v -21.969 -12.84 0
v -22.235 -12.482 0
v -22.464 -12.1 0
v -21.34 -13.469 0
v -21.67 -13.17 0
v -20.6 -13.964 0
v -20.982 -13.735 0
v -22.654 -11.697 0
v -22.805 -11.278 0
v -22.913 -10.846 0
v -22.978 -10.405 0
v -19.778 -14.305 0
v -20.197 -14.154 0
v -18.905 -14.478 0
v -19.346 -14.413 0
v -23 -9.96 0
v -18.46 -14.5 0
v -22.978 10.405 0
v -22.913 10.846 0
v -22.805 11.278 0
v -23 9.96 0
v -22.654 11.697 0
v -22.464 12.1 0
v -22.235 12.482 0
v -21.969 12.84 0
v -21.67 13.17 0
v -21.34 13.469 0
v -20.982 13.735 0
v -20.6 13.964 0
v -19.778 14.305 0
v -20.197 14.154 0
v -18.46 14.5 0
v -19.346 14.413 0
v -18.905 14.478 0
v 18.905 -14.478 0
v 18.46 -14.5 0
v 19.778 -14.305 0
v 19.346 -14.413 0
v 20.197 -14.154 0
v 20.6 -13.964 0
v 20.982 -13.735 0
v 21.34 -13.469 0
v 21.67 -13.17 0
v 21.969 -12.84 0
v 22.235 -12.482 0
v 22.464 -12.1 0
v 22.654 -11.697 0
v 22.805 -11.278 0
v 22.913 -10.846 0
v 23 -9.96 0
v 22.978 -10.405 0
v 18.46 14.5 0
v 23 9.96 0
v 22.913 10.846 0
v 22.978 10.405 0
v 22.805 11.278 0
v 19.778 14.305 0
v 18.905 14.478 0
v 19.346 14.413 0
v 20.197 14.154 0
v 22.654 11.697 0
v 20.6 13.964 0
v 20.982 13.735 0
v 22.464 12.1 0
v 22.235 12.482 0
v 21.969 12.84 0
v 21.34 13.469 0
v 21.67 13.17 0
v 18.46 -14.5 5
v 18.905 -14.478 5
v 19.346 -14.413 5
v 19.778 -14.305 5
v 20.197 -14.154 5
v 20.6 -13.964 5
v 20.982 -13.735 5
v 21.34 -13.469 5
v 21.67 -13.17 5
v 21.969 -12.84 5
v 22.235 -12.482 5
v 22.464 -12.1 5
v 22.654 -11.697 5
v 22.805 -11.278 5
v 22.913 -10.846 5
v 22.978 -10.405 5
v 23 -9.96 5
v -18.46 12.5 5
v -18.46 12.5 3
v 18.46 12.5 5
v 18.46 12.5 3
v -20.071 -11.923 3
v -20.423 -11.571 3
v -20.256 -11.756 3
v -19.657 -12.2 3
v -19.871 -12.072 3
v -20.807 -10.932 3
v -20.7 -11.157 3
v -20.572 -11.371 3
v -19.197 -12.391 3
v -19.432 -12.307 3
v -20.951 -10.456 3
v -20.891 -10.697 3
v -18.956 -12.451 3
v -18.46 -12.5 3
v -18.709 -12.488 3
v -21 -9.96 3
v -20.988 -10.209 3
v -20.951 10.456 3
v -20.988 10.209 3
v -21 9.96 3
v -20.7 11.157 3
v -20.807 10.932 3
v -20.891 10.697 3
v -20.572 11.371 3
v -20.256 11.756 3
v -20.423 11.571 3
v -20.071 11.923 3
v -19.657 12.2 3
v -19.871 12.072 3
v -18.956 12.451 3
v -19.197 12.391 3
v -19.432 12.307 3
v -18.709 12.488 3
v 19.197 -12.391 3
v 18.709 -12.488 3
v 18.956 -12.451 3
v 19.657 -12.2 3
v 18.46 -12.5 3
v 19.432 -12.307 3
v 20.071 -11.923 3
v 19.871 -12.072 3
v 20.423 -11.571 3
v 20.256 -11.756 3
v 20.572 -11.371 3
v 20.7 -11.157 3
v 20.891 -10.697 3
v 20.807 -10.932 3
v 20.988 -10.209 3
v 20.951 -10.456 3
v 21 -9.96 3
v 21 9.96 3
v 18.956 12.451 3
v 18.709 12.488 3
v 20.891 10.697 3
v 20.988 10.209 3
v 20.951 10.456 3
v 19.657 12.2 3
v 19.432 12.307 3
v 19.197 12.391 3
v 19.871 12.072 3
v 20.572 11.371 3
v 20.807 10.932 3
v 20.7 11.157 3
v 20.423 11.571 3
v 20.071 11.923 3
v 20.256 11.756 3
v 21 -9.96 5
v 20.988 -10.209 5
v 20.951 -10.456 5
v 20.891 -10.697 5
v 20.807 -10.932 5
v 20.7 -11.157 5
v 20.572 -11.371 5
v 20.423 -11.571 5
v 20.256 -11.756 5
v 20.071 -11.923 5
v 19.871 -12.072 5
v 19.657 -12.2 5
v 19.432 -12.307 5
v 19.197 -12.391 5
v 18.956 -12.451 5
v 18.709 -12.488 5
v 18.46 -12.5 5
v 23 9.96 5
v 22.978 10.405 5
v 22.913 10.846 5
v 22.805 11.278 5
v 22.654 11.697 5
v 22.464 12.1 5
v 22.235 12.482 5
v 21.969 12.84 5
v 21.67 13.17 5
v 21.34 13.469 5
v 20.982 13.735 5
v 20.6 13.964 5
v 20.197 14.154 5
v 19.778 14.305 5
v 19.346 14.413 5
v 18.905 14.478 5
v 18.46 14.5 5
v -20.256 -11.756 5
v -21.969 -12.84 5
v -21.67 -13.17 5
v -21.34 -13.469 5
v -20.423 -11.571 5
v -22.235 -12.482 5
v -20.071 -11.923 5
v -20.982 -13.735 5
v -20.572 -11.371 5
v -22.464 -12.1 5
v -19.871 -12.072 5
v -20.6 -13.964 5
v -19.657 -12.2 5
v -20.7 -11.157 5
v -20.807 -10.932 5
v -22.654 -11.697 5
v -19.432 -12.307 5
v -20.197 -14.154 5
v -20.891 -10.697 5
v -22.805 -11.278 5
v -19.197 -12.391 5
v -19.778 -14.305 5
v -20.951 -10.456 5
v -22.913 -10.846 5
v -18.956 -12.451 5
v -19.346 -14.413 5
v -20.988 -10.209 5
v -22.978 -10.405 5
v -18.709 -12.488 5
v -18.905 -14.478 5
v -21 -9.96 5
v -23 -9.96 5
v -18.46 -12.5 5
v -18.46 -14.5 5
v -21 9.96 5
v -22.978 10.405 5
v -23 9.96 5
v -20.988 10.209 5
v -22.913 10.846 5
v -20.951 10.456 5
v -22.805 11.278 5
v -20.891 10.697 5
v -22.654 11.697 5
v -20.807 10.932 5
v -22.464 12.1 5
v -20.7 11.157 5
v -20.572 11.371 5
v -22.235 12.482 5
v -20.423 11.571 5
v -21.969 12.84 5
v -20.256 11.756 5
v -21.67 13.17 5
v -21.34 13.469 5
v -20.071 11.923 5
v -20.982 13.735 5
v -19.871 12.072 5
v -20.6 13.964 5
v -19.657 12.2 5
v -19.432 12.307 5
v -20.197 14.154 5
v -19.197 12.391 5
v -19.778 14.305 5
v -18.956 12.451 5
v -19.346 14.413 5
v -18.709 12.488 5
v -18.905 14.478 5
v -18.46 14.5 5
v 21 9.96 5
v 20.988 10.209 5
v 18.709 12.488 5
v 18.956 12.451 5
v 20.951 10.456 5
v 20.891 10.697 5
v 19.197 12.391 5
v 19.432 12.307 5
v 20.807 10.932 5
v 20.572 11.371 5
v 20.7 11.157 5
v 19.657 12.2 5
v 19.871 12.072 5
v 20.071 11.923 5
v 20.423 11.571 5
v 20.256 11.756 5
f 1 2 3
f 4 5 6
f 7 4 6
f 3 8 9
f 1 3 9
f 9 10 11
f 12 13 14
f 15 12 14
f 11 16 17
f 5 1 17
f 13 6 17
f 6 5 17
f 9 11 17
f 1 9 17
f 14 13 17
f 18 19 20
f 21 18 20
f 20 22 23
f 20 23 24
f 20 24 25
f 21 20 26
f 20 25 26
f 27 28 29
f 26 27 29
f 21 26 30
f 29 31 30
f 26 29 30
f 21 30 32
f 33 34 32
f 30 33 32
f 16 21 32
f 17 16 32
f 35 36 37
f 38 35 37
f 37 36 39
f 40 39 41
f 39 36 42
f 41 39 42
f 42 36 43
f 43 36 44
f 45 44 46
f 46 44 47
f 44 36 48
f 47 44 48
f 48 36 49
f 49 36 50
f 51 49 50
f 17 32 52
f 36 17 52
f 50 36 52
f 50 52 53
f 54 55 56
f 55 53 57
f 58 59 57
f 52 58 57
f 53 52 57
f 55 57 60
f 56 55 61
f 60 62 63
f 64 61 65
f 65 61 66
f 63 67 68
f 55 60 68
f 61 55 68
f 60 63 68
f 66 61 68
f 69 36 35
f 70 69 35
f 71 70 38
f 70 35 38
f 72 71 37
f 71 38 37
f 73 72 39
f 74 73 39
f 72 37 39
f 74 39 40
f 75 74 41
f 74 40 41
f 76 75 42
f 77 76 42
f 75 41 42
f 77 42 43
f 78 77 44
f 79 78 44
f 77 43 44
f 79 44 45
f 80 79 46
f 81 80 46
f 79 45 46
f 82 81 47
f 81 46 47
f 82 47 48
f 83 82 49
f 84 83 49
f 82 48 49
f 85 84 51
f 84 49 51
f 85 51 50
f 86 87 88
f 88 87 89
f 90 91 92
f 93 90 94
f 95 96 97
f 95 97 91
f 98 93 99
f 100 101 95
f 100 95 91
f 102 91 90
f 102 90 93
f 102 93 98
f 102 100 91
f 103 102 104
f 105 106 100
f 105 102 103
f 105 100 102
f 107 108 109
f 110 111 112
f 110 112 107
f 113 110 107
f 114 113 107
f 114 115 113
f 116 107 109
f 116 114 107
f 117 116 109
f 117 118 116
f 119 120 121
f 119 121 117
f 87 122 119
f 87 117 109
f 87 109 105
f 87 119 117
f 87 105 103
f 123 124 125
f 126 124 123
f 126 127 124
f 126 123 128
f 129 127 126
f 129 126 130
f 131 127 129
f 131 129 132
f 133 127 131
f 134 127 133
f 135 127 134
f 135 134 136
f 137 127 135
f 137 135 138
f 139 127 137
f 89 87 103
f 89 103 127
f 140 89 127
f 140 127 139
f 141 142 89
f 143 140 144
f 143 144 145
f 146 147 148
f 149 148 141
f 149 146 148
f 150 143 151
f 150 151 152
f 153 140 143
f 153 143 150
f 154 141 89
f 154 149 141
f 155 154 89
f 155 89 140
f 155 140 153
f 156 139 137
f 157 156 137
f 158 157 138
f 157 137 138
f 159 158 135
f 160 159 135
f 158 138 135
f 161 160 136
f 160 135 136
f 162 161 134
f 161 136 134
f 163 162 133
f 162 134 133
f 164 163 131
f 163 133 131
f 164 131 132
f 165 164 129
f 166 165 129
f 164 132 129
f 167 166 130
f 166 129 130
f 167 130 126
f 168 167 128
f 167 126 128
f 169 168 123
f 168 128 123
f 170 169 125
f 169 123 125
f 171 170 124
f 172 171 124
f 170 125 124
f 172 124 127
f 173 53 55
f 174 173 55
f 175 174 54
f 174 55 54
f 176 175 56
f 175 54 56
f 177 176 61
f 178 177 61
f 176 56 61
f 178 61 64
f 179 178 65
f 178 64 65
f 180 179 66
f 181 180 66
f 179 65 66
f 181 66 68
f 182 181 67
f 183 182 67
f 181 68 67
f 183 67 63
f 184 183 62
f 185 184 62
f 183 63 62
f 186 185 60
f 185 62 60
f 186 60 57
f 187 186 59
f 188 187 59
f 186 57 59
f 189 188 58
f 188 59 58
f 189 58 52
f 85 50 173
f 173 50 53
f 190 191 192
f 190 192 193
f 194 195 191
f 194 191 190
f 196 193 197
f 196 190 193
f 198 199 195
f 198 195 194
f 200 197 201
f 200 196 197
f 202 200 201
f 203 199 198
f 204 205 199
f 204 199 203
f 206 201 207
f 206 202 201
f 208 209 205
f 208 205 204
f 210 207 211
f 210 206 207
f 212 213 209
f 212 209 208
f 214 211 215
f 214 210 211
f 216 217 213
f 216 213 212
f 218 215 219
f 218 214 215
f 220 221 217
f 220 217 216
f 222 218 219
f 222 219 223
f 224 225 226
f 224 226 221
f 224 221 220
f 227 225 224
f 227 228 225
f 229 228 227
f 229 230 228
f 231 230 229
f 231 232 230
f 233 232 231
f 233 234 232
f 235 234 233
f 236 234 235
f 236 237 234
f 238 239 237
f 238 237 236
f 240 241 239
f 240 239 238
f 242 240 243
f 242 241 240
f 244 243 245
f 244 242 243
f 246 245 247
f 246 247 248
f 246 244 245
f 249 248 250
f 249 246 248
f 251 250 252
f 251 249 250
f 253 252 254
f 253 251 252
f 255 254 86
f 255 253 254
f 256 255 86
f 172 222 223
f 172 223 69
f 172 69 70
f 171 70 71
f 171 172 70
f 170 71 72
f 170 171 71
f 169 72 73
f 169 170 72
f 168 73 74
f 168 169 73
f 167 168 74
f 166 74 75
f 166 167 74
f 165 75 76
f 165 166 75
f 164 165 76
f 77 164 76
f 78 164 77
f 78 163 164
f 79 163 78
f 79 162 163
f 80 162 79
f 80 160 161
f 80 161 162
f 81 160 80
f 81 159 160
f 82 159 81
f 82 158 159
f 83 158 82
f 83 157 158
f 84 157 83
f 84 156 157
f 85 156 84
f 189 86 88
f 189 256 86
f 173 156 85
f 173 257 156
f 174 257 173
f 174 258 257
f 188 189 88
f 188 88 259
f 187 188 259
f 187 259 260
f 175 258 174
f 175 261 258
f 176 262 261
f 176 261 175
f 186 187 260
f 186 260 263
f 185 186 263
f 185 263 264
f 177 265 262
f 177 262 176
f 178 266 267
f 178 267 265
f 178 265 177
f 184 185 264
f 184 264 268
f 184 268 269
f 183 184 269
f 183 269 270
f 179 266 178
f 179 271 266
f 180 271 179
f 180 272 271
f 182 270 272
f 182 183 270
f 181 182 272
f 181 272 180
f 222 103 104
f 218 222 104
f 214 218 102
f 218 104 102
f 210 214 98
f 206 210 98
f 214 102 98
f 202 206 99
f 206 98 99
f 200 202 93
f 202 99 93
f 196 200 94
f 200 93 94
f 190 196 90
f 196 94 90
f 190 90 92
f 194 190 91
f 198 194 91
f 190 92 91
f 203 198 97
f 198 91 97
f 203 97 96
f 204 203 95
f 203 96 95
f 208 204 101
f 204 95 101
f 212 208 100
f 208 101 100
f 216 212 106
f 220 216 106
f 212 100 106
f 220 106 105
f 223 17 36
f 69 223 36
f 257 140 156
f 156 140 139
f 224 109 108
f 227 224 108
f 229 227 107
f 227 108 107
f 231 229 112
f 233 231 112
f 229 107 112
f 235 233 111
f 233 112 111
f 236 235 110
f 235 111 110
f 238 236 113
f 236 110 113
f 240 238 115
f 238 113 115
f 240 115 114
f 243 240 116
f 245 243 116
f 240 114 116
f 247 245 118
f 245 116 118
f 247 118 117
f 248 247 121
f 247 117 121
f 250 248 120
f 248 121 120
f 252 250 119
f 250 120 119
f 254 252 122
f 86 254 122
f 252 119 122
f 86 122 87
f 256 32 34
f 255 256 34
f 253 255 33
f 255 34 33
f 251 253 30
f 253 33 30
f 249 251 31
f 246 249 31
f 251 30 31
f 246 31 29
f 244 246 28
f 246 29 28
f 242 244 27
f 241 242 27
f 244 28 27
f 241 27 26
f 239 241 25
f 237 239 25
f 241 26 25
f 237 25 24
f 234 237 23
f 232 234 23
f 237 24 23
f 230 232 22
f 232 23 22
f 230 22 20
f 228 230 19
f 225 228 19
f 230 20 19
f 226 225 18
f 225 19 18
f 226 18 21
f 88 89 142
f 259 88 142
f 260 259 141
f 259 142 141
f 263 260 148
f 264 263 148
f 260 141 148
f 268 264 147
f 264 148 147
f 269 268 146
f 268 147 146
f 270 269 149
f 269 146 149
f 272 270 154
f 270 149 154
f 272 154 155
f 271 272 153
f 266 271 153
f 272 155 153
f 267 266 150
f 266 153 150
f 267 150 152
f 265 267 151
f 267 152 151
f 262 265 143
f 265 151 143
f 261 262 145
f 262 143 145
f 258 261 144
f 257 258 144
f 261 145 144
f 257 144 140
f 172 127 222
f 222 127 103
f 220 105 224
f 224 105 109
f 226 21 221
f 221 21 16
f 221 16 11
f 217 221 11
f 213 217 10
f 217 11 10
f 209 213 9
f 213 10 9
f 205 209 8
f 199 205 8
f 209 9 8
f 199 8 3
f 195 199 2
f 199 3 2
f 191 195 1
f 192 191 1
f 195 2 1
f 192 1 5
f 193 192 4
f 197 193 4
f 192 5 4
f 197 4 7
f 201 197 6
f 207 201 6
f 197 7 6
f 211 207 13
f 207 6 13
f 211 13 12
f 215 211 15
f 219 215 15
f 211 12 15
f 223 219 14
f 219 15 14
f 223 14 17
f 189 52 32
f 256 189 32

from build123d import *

# Parameters (mm, degrees)
F2_DEPTH = 3
F3_DEPTH = 5


with BuildPart() as f2:
    # F0 (on Top) → F2 (new body)
    with BuildSketch(Plane.XY):
        with BuildLine():
            ThreePointArc((21, 9.96), (20.256051, 11.756051), (18.46, 12.5))
            Line((18.46, 12.5), (-18.46, 12.5))
            ThreePointArc((-18.46, 12.5), (-20.256051, 11.756051), (-21, 9.96))
            Line((-21, 9.96), (-21, -9.96))
            ThreePointArc((-21, -9.96), (-20.256051, -11.756051), (-18.46, -12.5))
            Line((-18.46, -12.5), (18.46, -12.5))
            ThreePointArc((18.46, -12.5), (20.256051, -11.756051), (21, -9.96))
            Line((21, -9.96), (21, 9.96))
        make_face()
    extrude(amount=F2_DEPTH)

    # F1 (on face) → F3 (join)
    with BuildSketch(Plane.XY):
        with BuildLine():
            ThreePointArc((23, 9.96), (21.670265, 13.170265), (18.46, 14.5))
            Line((18.46, 14.5), (-18.46, 14.5))
            ThreePointArc((-18.46, 14.5), (-21.670265, 13.170265), (-23, 9.96))
            Line((-23, 9.96), (-23, -9.96))
            ThreePointArc((-23, -9.96), (-21.670265, -13.170265), (-18.46, -14.5))
            Line((-18.46, -14.5), (18.46, -14.5))
            ThreePointArc((18.46, -14.5), (21.670265, -13.170265), (23, -9.96))
            Line((23, -9.96), (23, 9.96))
        make_face()
        with BuildLine():
            ThreePointArc((18.46, 12.5), (20.256051, 11.756051), (21, 9.96))
            Line((21, 9.96), (21, -9.96))
            ThreePointArc((21, -9.96), (20.256051, -11.756051), (18.46, -12.5))
            Line((18.46, -12.5), (-18.46, -12.5))
            ThreePointArc((-18.46, -12.5), (-20.256051, -11.756051), (-21, -9.96))
            Line((-21, -9.96), (-21, 9.96))
            ThreePointArc((-21, 9.96), (-20.256051, 11.756051), (-18.46, 12.5))
            Line((-18.46, 12.5), (18.46, 12.5))
        make_face(mode=Mode.SUBTRACT)
    extrude(amount=F3_DEPTH)


solid = f2.part
